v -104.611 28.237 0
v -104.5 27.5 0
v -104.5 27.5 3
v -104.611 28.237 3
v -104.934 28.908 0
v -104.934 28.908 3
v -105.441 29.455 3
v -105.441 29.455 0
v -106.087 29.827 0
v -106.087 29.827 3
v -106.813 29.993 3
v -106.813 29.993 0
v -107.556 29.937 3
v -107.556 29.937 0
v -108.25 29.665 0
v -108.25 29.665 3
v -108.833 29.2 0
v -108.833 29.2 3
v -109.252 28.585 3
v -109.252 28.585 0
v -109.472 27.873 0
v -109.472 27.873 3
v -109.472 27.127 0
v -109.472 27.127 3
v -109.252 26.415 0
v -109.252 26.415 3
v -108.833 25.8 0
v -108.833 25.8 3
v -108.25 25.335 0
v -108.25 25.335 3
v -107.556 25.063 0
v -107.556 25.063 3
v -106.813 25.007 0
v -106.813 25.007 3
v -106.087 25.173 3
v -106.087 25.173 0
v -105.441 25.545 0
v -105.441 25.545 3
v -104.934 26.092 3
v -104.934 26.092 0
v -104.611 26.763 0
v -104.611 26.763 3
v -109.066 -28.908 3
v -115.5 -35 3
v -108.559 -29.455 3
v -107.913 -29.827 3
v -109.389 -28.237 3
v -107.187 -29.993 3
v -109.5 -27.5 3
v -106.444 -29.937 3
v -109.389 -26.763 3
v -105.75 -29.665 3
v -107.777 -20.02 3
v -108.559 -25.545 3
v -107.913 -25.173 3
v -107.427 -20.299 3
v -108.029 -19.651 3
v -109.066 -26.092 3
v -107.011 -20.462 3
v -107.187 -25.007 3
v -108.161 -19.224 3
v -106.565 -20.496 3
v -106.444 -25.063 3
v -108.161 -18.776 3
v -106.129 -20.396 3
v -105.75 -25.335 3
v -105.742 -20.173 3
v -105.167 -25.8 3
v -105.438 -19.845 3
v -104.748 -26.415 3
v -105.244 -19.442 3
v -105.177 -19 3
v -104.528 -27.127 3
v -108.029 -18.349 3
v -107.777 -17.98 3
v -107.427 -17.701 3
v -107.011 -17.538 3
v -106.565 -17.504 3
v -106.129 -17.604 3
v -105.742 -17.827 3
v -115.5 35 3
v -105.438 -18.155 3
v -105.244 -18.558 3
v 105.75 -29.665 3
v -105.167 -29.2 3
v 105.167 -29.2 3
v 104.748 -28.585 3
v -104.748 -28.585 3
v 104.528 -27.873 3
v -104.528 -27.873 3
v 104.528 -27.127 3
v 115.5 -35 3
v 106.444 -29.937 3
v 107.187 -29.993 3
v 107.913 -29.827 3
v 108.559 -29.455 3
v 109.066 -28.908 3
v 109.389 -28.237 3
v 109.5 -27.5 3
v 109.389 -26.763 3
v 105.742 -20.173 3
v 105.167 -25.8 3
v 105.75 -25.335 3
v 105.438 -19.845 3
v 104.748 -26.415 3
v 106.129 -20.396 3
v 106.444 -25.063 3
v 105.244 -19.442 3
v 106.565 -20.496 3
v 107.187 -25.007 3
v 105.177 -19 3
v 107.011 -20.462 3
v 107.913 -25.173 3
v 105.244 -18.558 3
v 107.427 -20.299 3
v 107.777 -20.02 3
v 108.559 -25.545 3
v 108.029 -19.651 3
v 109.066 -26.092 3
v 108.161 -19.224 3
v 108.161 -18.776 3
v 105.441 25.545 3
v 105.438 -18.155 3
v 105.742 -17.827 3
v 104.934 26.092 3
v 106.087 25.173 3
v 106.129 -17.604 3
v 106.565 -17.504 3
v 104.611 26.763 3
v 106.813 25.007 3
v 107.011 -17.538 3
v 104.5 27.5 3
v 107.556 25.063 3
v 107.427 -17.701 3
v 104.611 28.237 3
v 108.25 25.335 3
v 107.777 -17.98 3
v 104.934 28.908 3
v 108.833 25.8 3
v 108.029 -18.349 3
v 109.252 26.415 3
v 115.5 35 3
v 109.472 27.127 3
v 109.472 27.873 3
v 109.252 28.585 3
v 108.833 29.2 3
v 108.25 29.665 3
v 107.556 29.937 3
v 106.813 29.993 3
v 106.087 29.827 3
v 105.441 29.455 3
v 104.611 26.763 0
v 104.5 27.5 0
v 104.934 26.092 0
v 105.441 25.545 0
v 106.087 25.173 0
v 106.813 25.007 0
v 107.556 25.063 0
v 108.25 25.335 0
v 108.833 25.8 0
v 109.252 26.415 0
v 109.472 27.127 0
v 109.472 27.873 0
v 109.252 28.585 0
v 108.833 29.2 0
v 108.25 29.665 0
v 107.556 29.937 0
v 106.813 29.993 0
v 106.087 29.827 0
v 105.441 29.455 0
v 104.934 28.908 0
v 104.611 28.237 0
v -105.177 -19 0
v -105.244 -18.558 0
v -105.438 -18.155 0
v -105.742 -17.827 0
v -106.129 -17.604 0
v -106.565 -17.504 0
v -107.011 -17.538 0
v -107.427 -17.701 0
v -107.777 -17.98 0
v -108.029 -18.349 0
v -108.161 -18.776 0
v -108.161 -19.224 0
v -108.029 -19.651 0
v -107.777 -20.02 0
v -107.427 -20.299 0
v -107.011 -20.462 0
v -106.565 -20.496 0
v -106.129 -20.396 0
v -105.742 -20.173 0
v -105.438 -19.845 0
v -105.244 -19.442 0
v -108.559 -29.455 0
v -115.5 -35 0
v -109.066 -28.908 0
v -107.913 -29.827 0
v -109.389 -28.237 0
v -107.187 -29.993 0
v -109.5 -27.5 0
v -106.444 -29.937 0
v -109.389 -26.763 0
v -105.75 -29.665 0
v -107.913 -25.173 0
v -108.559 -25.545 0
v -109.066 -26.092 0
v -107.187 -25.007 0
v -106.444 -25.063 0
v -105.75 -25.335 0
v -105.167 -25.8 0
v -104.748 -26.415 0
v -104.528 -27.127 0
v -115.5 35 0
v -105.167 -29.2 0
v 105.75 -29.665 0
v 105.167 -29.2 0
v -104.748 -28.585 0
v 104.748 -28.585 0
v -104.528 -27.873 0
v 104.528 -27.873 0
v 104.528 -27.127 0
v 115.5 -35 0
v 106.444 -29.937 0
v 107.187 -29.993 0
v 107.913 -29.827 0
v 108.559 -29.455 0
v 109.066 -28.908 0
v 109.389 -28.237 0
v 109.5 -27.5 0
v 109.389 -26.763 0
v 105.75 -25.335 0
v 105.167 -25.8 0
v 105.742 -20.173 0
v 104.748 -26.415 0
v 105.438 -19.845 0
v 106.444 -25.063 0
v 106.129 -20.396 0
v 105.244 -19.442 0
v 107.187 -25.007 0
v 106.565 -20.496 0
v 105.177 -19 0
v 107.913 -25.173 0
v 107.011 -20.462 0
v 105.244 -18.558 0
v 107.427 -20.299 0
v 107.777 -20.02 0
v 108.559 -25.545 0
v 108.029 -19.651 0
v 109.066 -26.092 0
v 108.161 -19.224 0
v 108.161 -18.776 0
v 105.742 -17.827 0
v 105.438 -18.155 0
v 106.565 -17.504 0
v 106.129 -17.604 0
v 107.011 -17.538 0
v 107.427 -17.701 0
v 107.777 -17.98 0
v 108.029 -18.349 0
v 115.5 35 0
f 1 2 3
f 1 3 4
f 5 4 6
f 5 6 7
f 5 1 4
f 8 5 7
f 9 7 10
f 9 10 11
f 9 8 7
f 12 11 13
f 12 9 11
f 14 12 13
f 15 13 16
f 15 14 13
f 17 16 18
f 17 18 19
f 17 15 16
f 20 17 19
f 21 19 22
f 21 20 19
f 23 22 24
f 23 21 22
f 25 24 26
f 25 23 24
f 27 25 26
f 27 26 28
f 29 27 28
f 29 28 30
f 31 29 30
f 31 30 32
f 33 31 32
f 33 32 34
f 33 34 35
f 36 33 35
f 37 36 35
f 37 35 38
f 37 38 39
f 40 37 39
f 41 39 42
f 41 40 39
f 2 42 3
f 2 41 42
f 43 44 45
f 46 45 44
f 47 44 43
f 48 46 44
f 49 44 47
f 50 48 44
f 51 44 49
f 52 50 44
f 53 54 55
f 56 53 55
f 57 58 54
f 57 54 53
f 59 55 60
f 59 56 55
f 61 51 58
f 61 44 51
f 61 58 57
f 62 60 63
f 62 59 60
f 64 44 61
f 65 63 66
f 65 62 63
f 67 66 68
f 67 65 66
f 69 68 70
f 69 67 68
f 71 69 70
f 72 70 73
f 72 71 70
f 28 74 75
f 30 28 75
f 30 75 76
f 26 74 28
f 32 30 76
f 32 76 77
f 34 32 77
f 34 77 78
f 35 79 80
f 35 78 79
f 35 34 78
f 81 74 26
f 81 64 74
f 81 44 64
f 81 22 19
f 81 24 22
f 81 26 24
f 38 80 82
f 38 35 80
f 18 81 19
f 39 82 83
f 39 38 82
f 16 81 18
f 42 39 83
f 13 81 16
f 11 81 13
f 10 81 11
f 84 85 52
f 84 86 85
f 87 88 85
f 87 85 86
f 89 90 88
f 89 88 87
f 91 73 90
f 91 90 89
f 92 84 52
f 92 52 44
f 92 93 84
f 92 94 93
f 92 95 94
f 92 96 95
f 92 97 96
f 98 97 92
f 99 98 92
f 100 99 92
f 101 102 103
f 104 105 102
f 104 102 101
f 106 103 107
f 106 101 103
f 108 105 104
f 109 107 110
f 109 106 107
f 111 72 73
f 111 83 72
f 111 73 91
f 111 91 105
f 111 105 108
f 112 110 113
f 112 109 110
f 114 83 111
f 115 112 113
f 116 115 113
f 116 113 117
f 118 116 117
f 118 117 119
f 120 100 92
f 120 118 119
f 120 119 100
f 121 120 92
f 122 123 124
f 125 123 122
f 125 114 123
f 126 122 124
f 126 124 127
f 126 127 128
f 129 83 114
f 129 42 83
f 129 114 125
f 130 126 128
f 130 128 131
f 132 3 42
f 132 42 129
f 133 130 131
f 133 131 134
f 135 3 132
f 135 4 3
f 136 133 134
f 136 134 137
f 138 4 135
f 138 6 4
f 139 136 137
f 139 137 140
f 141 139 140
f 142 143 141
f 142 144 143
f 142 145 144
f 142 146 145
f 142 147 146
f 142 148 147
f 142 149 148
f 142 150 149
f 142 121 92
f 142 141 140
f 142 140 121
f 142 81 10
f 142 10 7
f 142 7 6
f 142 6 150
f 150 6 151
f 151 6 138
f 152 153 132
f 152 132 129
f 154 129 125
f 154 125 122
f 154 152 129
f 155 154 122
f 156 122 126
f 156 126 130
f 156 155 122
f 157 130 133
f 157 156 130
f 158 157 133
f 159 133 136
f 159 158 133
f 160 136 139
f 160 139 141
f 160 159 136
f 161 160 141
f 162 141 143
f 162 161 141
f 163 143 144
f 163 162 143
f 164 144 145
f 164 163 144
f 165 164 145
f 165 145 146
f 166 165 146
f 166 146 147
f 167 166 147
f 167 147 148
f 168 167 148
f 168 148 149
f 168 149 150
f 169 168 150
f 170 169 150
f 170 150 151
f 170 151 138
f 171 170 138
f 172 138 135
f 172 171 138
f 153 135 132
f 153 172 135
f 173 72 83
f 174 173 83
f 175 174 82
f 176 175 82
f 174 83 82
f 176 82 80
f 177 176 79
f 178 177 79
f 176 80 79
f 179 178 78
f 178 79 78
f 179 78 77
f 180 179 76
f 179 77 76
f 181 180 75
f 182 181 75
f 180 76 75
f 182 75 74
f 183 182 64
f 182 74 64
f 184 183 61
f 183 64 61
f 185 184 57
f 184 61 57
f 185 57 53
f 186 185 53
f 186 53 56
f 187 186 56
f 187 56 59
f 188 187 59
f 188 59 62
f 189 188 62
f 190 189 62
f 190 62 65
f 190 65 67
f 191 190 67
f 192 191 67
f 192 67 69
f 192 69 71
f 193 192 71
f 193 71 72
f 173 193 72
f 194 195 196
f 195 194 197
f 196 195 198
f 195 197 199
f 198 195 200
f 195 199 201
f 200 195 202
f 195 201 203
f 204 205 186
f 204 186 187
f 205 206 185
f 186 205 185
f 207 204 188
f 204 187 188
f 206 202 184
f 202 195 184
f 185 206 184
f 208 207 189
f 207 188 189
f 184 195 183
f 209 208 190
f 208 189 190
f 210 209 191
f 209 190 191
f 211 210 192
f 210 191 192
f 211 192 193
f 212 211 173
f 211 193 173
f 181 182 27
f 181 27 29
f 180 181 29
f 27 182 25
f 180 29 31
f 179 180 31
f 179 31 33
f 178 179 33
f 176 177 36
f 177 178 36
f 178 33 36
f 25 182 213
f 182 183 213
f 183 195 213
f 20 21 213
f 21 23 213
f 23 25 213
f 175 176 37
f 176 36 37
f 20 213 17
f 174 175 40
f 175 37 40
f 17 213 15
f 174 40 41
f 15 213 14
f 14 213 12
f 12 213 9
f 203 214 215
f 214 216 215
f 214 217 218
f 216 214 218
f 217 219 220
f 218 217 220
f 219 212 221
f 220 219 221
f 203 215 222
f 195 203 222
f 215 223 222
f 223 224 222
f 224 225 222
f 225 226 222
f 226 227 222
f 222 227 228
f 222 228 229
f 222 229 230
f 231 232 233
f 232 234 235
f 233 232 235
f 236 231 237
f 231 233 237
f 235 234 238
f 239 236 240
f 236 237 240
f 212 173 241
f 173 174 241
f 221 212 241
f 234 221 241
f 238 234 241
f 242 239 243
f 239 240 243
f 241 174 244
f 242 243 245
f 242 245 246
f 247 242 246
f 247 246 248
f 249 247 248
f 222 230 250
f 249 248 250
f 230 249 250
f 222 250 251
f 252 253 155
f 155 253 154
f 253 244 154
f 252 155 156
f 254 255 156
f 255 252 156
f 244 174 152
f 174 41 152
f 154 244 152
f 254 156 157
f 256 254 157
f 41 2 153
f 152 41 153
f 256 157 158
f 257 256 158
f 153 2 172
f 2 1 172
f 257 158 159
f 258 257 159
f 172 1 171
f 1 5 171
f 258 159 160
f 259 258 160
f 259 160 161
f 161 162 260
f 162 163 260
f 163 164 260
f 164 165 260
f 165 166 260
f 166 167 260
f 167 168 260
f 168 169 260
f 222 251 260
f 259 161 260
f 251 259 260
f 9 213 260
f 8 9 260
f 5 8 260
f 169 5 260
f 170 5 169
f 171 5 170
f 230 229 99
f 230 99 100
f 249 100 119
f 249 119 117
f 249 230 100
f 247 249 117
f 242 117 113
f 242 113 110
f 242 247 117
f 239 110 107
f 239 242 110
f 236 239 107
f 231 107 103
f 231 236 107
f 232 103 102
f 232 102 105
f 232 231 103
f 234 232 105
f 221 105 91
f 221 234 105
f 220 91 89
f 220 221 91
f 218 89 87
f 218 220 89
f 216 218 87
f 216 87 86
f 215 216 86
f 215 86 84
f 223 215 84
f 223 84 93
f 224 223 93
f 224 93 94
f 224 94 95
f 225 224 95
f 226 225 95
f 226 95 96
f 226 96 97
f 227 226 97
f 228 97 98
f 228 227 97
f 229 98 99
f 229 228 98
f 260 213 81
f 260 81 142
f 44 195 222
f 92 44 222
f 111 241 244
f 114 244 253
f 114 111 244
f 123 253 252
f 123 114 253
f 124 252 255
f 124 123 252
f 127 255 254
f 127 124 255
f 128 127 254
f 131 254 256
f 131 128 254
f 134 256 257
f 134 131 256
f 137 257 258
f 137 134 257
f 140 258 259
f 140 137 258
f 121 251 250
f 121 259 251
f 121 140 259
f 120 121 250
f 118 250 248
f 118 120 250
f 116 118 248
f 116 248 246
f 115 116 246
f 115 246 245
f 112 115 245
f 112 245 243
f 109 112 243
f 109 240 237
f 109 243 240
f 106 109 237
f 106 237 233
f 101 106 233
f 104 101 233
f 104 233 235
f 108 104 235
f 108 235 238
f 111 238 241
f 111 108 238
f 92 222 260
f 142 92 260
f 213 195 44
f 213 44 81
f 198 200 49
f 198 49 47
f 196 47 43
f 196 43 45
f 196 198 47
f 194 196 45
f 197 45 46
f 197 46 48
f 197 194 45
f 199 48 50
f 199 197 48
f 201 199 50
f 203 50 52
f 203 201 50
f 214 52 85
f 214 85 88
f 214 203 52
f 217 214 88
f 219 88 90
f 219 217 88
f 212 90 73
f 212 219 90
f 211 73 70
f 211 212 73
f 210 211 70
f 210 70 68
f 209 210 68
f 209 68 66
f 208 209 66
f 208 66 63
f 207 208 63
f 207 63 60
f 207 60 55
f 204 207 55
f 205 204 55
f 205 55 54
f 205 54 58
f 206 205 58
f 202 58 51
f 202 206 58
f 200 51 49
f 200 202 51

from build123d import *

# Parameters (mm, degrees)
SKETCH_1_W          = 231
SKETCH_1_H          = 70
SKETCH_1_R          = 2.5
EXTRUDE_1_DEPTH     = 3
SKETCH_4_R          = 1.5
CUT_EXTRUDE_1_DEPTH = 10


with BuildPart() as part:
    # 草图1 → 凸台-拉伸1 (new body)
    with BuildSketch(Plane.XY):
        Rectangle(SKETCH_1_W, SKETCH_1_H)
        with Locations((-107, 27.5)):
            Circle(SKETCH_1_R, mode=Mode.SUBTRACT)
        with Locations(Location((-107, -27.5, 0), (0, 0, 180))):
            Circle(SKETCH_1_R, mode=Mode.SUBTRACT)
        with Locations((107, -27.5)):
            Circle(SKETCH_1_R, mode=Mode.SUBTRACT)
        with Locations(Location((107, 27.5, 0), (0, 0, 180))):
            Circle(SKETCH_1_R, mode=Mode.SUBTRACT)
    extrude(amount=EXTRUDE_1_DEPTH)

    # 草图4 → 切除-拉伸1 (cut)
    with BuildSketch(Plane.XY.offset(3)):
        with Locations((-106.677486576, -19)):
            Circle(SKETCH_4_R)
    cut_extrude_1 = extrude(amount=-CUT_EXTRUDE_1_DEPTH, mode=Mode.SUBTRACT)

    # 镜向1: 切除-拉伸1 across plane
    add(cut_extrude_1.mirror(Plane(origin=(0, 0, 0), x_dir=(0, 0, 1), z_dir=(1, 0, 0))), mode=Mode.SUBTRACT)


solid = part.part
